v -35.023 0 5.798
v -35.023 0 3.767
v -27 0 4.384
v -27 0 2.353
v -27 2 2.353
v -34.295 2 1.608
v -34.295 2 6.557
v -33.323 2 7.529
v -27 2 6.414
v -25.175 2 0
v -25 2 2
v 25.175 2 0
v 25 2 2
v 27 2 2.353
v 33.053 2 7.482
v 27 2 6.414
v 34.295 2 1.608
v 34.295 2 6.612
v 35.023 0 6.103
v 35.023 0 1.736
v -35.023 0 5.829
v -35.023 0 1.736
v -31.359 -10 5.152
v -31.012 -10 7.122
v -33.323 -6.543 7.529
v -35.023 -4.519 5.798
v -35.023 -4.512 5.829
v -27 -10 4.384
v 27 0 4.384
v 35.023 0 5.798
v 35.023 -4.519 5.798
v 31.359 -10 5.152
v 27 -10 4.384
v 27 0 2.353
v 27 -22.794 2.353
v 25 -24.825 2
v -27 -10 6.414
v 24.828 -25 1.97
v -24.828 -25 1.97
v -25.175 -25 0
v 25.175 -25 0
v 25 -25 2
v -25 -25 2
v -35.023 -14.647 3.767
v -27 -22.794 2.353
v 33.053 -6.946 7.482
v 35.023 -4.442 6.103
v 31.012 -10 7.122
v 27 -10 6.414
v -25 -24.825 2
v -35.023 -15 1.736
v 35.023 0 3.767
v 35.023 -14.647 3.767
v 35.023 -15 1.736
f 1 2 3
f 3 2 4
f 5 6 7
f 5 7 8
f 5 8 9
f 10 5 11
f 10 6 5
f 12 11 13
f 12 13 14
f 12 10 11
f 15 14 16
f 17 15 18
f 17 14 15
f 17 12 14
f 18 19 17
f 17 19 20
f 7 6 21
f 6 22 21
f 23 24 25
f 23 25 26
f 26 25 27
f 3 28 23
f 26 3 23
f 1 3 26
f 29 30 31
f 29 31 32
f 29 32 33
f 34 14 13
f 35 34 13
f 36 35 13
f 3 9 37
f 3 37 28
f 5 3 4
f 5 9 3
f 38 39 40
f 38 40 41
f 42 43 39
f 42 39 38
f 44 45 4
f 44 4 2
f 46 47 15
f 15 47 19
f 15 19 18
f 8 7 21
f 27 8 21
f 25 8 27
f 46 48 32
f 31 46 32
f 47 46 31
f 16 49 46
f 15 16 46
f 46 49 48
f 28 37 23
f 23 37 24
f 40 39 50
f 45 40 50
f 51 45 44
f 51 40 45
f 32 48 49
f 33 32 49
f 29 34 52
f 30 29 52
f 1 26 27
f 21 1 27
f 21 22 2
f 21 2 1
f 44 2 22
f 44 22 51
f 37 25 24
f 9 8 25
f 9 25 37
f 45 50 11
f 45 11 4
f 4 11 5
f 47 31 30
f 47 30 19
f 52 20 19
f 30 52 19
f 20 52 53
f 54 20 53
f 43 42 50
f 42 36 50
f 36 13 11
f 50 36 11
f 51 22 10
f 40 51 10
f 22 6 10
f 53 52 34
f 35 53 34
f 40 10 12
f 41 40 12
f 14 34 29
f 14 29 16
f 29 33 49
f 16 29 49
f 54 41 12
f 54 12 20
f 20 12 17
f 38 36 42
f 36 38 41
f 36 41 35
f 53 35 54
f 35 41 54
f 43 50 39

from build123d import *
from OCP.BRepFilletAPI import BRepFilletAPI_MakeChamfer

# Parameters (mm, degrees)
BOSS_EXTRUDE1_DEPTH = 2
BOSS_EXTRUDE2_DEPTH = 25
BOSS_EXTRUDE3_DEPTH = 10
CUT_EXTRUDE4_DEPTH  = 2
CUT_EXTRUDE5_DEPTH  = 2
CUT_EXTRUDE6_DEPTH  = 2
CUT_EXTRUDE7_DEPTH  = 2
CHAMFER1_SIZE       = 0.727940469
CHAMFER1_SIZE_2     = 2
CHAMFER2_SIZE       = 2
CHAMFER2_SIZE2      = 1.72643598


with BuildPart() as part:
    # Sketch12 → Boss-Extrude1 (new body)
    with BuildSketch(Plane(origin=(0, 0, 0), x_dir=(1, 0, 0), z_dir=(0, 1, 0))):
        Polygon((-27, -6.414360409), (-27, -2.352653961), (-25, -2), (25, -2), (27, -2.352653961), (27, -6.414360409), (35.023054857, -7.829041448), (35.023054857, -1.736481777), (25.174977327, 0), (-25.174977327, 0), (-35.023054857, -1.736481777), (-35.023054857, -7.829041448), align=None)
    extrude(amount=BOSS_EXTRUDE1_DEPTH)

    # Sketch13 → Boss-Extrude2 (add)
    with BuildSketch(Plane.XZ):
        Polygon((25.174977327, 0), (35.023054857, 1.736481777), (35.023054857, 3.767335), (27, 2.352653961), (25, 2), (-25, 2), (-27, 2.352653961), (-35.023054857, 3.767335), (-35.023054857, 1.736481777), (-25.174977327, 0), align=None)
    extrude(amount=BOSS_EXTRUDE2_DEPTH)

    # Sketch14 → Boss-Extrude3 (add)
    with BuildSketch(Plane.XZ):
        Polygon((-35.023054857, 7.829041448), (-27, 6.414360409), (-27, 4.383507185), (-35.023054857, 5.798188224), align=None)
        Polygon((27, 6.414360409), (35.023054857, 7.829041448), (35.023054857, 5.798188224), (27, 4.383507185), align=None)
    extrude(amount=BOSS_EXTRUDE3_DEPTH)

    # Sketch15 → Cut-Extrude4 (cut)
    with BuildSketch(Plane(origin=(0.759118452, 0, -4.305174677), x_dir=(-0.9848077530121055, 0, -0.1736481776675121), z_dir=(0.1736481776675121, 0, -0.9848077530121055))):
        Polygon((-24.792512854, -25), (-35.145166815, -14.647346039), (-35.145166815, -25), align=None)
    extrude(amount=-CUT_EXTRUDE4_DEPTH, mode=Mode.SUBTRACT)

    # Sketch16 → Cut-Extrude5 (cut)
    with BuildSketch(Plane(origin=(-0.759118452, 0, -4.305174677), x_dir=(-0.9848077530121054, 0, 0.17364817766751298), z_dir=(-0.17364817766751298, 0, -0.9848077530121054))):
        Polygon((24.792512854, -25), (35.145166815, -14.647346039), (35.145166815, -25), align=None)
    extrude(amount=-CUT_EXTRUDE5_DEPTH, mode=Mode.SUBTRACT)

    # Sketch18 → Cut-Extrude6 (cut)
    with BuildSketch(Plane(origin=(0.282770614, 0, 1.603671841), x_dir=(0.9848077530121053, 0, -0.17364817766751298), z_dir=(0.173648177667513, 0, 0.9848077530121054))):
        Polygon((-31.777063033, -10), (-35.850474738, -4), (-35.850474738, -10), align=None)
    extrude(amount=-CUT_EXTRUDE6_DEPTH, mode=Mode.SUBTRACT)

    # Sketch19 → Cut-Extrude7 (cut)
    with BuildSketch(Plane(origin=(-0.282770614, 0, 1.603671841), x_dir=(0.9848077530121055, 0, 0.17364817766751214), z_dir=(-0.17364817766751214, 0, 0.9848077530121055))):
        Polygon((31.777063033, -10), (35.850474738, -4), (35.850474738, -10), align=None)
    extrude(amount=-CUT_EXTRUDE7_DEPTH, mode=Mode.SUBTRACT)

    # Chamfer1
    chamfer1_edges_1 = [part.edges().sort_by_distance(p)[0] for p in [
        (-35.023054857, 2, 4.782761612),
    ]]
    chamfer1_side_1 = [part.faces().sort_by_distance(p)[0] for p in [
        (-35.008496048, 2, 4.782761612),
    ]]
    chamfer1_edges_2 = [part.edges().sort_by_distance(p)[0] for p in [
        (35.023054857, 2, 4.782761612),
    ]]
    chamfer1_side_2 = [part.faces().sort_by_distance(p)[0] for p in [
        (35.008496048, 2, 4.782761612),
    ]]
    chamfer1 = BRepFilletAPI_MakeChamfer(part.part.solid().wrapped)
    for e in chamfer1_edges_1:
        chamfer1.Add(CHAMFER1_SIZE - 0.0001, CHAMFER1_SIZE_2 - 0.0001, e.wrapped, chamfer1_side_1[0].wrapped)
    for e in chamfer1_edges_2:
        chamfer1.Add(CHAMFER1_SIZE - 0.0001, CHAMFER1_SIZE_2 - 0.0001, e.wrapped, chamfer1_side_2[0].wrapped)
    add(Compound.cast(chamfer1.Shape()), mode=Mode.REPLACE)  # a hair under: the kernel refuses the full size

    # Chamfer2: one chamfer whose edges measure the first distance from different faces: ONE call of the kernel's chamfer builder (chamfer() names one face for all edges)
    chamfer2_edges_1 = [part.edges().sort_by_distance(p)[0] for p in [
        (-35.023054857, -1.99995, 7.829041448),
    ]]
    chamfer2_side_1 = [part.faces().sort_by_distance(p)[0] for p in [
        (-35.023054857, -6.233576758, 3.65083088),
    ]]
    chamfer2_edges_2 = [part.edges().sort_by_distance(p)[0] for p in [
        (35.023054857, -1.99995, 7.829041448),
    ]]
    chamfer2_side_2 = [part.faces().sort_by_distance(p)[0] for p in [
        (30.593302678, -3.470070419, 7.047956621),
    ]]
    chamfer2 = BRepFilletAPI_MakeChamfer(part.part.solid().wrapped)
    for e in chamfer2_edges_1:
        chamfer2.Add(CHAMFER2_SIZE, CHAMFER2_SIZE2, e.wrapped, chamfer2_side_1[0].wrapped)  # the first distance lies on this face
    for e in chamfer2_edges_2:
        chamfer2.Add(CHAMFER2_SIZE, CHAMFER2_SIZE2, e.wrapped, chamfer2_side_2[0].wrapped)  # the first distance lies on this face
    add(Compound.cast(chamfer2.Shape()), mode=Mode.REPLACE)


solid = part.part
